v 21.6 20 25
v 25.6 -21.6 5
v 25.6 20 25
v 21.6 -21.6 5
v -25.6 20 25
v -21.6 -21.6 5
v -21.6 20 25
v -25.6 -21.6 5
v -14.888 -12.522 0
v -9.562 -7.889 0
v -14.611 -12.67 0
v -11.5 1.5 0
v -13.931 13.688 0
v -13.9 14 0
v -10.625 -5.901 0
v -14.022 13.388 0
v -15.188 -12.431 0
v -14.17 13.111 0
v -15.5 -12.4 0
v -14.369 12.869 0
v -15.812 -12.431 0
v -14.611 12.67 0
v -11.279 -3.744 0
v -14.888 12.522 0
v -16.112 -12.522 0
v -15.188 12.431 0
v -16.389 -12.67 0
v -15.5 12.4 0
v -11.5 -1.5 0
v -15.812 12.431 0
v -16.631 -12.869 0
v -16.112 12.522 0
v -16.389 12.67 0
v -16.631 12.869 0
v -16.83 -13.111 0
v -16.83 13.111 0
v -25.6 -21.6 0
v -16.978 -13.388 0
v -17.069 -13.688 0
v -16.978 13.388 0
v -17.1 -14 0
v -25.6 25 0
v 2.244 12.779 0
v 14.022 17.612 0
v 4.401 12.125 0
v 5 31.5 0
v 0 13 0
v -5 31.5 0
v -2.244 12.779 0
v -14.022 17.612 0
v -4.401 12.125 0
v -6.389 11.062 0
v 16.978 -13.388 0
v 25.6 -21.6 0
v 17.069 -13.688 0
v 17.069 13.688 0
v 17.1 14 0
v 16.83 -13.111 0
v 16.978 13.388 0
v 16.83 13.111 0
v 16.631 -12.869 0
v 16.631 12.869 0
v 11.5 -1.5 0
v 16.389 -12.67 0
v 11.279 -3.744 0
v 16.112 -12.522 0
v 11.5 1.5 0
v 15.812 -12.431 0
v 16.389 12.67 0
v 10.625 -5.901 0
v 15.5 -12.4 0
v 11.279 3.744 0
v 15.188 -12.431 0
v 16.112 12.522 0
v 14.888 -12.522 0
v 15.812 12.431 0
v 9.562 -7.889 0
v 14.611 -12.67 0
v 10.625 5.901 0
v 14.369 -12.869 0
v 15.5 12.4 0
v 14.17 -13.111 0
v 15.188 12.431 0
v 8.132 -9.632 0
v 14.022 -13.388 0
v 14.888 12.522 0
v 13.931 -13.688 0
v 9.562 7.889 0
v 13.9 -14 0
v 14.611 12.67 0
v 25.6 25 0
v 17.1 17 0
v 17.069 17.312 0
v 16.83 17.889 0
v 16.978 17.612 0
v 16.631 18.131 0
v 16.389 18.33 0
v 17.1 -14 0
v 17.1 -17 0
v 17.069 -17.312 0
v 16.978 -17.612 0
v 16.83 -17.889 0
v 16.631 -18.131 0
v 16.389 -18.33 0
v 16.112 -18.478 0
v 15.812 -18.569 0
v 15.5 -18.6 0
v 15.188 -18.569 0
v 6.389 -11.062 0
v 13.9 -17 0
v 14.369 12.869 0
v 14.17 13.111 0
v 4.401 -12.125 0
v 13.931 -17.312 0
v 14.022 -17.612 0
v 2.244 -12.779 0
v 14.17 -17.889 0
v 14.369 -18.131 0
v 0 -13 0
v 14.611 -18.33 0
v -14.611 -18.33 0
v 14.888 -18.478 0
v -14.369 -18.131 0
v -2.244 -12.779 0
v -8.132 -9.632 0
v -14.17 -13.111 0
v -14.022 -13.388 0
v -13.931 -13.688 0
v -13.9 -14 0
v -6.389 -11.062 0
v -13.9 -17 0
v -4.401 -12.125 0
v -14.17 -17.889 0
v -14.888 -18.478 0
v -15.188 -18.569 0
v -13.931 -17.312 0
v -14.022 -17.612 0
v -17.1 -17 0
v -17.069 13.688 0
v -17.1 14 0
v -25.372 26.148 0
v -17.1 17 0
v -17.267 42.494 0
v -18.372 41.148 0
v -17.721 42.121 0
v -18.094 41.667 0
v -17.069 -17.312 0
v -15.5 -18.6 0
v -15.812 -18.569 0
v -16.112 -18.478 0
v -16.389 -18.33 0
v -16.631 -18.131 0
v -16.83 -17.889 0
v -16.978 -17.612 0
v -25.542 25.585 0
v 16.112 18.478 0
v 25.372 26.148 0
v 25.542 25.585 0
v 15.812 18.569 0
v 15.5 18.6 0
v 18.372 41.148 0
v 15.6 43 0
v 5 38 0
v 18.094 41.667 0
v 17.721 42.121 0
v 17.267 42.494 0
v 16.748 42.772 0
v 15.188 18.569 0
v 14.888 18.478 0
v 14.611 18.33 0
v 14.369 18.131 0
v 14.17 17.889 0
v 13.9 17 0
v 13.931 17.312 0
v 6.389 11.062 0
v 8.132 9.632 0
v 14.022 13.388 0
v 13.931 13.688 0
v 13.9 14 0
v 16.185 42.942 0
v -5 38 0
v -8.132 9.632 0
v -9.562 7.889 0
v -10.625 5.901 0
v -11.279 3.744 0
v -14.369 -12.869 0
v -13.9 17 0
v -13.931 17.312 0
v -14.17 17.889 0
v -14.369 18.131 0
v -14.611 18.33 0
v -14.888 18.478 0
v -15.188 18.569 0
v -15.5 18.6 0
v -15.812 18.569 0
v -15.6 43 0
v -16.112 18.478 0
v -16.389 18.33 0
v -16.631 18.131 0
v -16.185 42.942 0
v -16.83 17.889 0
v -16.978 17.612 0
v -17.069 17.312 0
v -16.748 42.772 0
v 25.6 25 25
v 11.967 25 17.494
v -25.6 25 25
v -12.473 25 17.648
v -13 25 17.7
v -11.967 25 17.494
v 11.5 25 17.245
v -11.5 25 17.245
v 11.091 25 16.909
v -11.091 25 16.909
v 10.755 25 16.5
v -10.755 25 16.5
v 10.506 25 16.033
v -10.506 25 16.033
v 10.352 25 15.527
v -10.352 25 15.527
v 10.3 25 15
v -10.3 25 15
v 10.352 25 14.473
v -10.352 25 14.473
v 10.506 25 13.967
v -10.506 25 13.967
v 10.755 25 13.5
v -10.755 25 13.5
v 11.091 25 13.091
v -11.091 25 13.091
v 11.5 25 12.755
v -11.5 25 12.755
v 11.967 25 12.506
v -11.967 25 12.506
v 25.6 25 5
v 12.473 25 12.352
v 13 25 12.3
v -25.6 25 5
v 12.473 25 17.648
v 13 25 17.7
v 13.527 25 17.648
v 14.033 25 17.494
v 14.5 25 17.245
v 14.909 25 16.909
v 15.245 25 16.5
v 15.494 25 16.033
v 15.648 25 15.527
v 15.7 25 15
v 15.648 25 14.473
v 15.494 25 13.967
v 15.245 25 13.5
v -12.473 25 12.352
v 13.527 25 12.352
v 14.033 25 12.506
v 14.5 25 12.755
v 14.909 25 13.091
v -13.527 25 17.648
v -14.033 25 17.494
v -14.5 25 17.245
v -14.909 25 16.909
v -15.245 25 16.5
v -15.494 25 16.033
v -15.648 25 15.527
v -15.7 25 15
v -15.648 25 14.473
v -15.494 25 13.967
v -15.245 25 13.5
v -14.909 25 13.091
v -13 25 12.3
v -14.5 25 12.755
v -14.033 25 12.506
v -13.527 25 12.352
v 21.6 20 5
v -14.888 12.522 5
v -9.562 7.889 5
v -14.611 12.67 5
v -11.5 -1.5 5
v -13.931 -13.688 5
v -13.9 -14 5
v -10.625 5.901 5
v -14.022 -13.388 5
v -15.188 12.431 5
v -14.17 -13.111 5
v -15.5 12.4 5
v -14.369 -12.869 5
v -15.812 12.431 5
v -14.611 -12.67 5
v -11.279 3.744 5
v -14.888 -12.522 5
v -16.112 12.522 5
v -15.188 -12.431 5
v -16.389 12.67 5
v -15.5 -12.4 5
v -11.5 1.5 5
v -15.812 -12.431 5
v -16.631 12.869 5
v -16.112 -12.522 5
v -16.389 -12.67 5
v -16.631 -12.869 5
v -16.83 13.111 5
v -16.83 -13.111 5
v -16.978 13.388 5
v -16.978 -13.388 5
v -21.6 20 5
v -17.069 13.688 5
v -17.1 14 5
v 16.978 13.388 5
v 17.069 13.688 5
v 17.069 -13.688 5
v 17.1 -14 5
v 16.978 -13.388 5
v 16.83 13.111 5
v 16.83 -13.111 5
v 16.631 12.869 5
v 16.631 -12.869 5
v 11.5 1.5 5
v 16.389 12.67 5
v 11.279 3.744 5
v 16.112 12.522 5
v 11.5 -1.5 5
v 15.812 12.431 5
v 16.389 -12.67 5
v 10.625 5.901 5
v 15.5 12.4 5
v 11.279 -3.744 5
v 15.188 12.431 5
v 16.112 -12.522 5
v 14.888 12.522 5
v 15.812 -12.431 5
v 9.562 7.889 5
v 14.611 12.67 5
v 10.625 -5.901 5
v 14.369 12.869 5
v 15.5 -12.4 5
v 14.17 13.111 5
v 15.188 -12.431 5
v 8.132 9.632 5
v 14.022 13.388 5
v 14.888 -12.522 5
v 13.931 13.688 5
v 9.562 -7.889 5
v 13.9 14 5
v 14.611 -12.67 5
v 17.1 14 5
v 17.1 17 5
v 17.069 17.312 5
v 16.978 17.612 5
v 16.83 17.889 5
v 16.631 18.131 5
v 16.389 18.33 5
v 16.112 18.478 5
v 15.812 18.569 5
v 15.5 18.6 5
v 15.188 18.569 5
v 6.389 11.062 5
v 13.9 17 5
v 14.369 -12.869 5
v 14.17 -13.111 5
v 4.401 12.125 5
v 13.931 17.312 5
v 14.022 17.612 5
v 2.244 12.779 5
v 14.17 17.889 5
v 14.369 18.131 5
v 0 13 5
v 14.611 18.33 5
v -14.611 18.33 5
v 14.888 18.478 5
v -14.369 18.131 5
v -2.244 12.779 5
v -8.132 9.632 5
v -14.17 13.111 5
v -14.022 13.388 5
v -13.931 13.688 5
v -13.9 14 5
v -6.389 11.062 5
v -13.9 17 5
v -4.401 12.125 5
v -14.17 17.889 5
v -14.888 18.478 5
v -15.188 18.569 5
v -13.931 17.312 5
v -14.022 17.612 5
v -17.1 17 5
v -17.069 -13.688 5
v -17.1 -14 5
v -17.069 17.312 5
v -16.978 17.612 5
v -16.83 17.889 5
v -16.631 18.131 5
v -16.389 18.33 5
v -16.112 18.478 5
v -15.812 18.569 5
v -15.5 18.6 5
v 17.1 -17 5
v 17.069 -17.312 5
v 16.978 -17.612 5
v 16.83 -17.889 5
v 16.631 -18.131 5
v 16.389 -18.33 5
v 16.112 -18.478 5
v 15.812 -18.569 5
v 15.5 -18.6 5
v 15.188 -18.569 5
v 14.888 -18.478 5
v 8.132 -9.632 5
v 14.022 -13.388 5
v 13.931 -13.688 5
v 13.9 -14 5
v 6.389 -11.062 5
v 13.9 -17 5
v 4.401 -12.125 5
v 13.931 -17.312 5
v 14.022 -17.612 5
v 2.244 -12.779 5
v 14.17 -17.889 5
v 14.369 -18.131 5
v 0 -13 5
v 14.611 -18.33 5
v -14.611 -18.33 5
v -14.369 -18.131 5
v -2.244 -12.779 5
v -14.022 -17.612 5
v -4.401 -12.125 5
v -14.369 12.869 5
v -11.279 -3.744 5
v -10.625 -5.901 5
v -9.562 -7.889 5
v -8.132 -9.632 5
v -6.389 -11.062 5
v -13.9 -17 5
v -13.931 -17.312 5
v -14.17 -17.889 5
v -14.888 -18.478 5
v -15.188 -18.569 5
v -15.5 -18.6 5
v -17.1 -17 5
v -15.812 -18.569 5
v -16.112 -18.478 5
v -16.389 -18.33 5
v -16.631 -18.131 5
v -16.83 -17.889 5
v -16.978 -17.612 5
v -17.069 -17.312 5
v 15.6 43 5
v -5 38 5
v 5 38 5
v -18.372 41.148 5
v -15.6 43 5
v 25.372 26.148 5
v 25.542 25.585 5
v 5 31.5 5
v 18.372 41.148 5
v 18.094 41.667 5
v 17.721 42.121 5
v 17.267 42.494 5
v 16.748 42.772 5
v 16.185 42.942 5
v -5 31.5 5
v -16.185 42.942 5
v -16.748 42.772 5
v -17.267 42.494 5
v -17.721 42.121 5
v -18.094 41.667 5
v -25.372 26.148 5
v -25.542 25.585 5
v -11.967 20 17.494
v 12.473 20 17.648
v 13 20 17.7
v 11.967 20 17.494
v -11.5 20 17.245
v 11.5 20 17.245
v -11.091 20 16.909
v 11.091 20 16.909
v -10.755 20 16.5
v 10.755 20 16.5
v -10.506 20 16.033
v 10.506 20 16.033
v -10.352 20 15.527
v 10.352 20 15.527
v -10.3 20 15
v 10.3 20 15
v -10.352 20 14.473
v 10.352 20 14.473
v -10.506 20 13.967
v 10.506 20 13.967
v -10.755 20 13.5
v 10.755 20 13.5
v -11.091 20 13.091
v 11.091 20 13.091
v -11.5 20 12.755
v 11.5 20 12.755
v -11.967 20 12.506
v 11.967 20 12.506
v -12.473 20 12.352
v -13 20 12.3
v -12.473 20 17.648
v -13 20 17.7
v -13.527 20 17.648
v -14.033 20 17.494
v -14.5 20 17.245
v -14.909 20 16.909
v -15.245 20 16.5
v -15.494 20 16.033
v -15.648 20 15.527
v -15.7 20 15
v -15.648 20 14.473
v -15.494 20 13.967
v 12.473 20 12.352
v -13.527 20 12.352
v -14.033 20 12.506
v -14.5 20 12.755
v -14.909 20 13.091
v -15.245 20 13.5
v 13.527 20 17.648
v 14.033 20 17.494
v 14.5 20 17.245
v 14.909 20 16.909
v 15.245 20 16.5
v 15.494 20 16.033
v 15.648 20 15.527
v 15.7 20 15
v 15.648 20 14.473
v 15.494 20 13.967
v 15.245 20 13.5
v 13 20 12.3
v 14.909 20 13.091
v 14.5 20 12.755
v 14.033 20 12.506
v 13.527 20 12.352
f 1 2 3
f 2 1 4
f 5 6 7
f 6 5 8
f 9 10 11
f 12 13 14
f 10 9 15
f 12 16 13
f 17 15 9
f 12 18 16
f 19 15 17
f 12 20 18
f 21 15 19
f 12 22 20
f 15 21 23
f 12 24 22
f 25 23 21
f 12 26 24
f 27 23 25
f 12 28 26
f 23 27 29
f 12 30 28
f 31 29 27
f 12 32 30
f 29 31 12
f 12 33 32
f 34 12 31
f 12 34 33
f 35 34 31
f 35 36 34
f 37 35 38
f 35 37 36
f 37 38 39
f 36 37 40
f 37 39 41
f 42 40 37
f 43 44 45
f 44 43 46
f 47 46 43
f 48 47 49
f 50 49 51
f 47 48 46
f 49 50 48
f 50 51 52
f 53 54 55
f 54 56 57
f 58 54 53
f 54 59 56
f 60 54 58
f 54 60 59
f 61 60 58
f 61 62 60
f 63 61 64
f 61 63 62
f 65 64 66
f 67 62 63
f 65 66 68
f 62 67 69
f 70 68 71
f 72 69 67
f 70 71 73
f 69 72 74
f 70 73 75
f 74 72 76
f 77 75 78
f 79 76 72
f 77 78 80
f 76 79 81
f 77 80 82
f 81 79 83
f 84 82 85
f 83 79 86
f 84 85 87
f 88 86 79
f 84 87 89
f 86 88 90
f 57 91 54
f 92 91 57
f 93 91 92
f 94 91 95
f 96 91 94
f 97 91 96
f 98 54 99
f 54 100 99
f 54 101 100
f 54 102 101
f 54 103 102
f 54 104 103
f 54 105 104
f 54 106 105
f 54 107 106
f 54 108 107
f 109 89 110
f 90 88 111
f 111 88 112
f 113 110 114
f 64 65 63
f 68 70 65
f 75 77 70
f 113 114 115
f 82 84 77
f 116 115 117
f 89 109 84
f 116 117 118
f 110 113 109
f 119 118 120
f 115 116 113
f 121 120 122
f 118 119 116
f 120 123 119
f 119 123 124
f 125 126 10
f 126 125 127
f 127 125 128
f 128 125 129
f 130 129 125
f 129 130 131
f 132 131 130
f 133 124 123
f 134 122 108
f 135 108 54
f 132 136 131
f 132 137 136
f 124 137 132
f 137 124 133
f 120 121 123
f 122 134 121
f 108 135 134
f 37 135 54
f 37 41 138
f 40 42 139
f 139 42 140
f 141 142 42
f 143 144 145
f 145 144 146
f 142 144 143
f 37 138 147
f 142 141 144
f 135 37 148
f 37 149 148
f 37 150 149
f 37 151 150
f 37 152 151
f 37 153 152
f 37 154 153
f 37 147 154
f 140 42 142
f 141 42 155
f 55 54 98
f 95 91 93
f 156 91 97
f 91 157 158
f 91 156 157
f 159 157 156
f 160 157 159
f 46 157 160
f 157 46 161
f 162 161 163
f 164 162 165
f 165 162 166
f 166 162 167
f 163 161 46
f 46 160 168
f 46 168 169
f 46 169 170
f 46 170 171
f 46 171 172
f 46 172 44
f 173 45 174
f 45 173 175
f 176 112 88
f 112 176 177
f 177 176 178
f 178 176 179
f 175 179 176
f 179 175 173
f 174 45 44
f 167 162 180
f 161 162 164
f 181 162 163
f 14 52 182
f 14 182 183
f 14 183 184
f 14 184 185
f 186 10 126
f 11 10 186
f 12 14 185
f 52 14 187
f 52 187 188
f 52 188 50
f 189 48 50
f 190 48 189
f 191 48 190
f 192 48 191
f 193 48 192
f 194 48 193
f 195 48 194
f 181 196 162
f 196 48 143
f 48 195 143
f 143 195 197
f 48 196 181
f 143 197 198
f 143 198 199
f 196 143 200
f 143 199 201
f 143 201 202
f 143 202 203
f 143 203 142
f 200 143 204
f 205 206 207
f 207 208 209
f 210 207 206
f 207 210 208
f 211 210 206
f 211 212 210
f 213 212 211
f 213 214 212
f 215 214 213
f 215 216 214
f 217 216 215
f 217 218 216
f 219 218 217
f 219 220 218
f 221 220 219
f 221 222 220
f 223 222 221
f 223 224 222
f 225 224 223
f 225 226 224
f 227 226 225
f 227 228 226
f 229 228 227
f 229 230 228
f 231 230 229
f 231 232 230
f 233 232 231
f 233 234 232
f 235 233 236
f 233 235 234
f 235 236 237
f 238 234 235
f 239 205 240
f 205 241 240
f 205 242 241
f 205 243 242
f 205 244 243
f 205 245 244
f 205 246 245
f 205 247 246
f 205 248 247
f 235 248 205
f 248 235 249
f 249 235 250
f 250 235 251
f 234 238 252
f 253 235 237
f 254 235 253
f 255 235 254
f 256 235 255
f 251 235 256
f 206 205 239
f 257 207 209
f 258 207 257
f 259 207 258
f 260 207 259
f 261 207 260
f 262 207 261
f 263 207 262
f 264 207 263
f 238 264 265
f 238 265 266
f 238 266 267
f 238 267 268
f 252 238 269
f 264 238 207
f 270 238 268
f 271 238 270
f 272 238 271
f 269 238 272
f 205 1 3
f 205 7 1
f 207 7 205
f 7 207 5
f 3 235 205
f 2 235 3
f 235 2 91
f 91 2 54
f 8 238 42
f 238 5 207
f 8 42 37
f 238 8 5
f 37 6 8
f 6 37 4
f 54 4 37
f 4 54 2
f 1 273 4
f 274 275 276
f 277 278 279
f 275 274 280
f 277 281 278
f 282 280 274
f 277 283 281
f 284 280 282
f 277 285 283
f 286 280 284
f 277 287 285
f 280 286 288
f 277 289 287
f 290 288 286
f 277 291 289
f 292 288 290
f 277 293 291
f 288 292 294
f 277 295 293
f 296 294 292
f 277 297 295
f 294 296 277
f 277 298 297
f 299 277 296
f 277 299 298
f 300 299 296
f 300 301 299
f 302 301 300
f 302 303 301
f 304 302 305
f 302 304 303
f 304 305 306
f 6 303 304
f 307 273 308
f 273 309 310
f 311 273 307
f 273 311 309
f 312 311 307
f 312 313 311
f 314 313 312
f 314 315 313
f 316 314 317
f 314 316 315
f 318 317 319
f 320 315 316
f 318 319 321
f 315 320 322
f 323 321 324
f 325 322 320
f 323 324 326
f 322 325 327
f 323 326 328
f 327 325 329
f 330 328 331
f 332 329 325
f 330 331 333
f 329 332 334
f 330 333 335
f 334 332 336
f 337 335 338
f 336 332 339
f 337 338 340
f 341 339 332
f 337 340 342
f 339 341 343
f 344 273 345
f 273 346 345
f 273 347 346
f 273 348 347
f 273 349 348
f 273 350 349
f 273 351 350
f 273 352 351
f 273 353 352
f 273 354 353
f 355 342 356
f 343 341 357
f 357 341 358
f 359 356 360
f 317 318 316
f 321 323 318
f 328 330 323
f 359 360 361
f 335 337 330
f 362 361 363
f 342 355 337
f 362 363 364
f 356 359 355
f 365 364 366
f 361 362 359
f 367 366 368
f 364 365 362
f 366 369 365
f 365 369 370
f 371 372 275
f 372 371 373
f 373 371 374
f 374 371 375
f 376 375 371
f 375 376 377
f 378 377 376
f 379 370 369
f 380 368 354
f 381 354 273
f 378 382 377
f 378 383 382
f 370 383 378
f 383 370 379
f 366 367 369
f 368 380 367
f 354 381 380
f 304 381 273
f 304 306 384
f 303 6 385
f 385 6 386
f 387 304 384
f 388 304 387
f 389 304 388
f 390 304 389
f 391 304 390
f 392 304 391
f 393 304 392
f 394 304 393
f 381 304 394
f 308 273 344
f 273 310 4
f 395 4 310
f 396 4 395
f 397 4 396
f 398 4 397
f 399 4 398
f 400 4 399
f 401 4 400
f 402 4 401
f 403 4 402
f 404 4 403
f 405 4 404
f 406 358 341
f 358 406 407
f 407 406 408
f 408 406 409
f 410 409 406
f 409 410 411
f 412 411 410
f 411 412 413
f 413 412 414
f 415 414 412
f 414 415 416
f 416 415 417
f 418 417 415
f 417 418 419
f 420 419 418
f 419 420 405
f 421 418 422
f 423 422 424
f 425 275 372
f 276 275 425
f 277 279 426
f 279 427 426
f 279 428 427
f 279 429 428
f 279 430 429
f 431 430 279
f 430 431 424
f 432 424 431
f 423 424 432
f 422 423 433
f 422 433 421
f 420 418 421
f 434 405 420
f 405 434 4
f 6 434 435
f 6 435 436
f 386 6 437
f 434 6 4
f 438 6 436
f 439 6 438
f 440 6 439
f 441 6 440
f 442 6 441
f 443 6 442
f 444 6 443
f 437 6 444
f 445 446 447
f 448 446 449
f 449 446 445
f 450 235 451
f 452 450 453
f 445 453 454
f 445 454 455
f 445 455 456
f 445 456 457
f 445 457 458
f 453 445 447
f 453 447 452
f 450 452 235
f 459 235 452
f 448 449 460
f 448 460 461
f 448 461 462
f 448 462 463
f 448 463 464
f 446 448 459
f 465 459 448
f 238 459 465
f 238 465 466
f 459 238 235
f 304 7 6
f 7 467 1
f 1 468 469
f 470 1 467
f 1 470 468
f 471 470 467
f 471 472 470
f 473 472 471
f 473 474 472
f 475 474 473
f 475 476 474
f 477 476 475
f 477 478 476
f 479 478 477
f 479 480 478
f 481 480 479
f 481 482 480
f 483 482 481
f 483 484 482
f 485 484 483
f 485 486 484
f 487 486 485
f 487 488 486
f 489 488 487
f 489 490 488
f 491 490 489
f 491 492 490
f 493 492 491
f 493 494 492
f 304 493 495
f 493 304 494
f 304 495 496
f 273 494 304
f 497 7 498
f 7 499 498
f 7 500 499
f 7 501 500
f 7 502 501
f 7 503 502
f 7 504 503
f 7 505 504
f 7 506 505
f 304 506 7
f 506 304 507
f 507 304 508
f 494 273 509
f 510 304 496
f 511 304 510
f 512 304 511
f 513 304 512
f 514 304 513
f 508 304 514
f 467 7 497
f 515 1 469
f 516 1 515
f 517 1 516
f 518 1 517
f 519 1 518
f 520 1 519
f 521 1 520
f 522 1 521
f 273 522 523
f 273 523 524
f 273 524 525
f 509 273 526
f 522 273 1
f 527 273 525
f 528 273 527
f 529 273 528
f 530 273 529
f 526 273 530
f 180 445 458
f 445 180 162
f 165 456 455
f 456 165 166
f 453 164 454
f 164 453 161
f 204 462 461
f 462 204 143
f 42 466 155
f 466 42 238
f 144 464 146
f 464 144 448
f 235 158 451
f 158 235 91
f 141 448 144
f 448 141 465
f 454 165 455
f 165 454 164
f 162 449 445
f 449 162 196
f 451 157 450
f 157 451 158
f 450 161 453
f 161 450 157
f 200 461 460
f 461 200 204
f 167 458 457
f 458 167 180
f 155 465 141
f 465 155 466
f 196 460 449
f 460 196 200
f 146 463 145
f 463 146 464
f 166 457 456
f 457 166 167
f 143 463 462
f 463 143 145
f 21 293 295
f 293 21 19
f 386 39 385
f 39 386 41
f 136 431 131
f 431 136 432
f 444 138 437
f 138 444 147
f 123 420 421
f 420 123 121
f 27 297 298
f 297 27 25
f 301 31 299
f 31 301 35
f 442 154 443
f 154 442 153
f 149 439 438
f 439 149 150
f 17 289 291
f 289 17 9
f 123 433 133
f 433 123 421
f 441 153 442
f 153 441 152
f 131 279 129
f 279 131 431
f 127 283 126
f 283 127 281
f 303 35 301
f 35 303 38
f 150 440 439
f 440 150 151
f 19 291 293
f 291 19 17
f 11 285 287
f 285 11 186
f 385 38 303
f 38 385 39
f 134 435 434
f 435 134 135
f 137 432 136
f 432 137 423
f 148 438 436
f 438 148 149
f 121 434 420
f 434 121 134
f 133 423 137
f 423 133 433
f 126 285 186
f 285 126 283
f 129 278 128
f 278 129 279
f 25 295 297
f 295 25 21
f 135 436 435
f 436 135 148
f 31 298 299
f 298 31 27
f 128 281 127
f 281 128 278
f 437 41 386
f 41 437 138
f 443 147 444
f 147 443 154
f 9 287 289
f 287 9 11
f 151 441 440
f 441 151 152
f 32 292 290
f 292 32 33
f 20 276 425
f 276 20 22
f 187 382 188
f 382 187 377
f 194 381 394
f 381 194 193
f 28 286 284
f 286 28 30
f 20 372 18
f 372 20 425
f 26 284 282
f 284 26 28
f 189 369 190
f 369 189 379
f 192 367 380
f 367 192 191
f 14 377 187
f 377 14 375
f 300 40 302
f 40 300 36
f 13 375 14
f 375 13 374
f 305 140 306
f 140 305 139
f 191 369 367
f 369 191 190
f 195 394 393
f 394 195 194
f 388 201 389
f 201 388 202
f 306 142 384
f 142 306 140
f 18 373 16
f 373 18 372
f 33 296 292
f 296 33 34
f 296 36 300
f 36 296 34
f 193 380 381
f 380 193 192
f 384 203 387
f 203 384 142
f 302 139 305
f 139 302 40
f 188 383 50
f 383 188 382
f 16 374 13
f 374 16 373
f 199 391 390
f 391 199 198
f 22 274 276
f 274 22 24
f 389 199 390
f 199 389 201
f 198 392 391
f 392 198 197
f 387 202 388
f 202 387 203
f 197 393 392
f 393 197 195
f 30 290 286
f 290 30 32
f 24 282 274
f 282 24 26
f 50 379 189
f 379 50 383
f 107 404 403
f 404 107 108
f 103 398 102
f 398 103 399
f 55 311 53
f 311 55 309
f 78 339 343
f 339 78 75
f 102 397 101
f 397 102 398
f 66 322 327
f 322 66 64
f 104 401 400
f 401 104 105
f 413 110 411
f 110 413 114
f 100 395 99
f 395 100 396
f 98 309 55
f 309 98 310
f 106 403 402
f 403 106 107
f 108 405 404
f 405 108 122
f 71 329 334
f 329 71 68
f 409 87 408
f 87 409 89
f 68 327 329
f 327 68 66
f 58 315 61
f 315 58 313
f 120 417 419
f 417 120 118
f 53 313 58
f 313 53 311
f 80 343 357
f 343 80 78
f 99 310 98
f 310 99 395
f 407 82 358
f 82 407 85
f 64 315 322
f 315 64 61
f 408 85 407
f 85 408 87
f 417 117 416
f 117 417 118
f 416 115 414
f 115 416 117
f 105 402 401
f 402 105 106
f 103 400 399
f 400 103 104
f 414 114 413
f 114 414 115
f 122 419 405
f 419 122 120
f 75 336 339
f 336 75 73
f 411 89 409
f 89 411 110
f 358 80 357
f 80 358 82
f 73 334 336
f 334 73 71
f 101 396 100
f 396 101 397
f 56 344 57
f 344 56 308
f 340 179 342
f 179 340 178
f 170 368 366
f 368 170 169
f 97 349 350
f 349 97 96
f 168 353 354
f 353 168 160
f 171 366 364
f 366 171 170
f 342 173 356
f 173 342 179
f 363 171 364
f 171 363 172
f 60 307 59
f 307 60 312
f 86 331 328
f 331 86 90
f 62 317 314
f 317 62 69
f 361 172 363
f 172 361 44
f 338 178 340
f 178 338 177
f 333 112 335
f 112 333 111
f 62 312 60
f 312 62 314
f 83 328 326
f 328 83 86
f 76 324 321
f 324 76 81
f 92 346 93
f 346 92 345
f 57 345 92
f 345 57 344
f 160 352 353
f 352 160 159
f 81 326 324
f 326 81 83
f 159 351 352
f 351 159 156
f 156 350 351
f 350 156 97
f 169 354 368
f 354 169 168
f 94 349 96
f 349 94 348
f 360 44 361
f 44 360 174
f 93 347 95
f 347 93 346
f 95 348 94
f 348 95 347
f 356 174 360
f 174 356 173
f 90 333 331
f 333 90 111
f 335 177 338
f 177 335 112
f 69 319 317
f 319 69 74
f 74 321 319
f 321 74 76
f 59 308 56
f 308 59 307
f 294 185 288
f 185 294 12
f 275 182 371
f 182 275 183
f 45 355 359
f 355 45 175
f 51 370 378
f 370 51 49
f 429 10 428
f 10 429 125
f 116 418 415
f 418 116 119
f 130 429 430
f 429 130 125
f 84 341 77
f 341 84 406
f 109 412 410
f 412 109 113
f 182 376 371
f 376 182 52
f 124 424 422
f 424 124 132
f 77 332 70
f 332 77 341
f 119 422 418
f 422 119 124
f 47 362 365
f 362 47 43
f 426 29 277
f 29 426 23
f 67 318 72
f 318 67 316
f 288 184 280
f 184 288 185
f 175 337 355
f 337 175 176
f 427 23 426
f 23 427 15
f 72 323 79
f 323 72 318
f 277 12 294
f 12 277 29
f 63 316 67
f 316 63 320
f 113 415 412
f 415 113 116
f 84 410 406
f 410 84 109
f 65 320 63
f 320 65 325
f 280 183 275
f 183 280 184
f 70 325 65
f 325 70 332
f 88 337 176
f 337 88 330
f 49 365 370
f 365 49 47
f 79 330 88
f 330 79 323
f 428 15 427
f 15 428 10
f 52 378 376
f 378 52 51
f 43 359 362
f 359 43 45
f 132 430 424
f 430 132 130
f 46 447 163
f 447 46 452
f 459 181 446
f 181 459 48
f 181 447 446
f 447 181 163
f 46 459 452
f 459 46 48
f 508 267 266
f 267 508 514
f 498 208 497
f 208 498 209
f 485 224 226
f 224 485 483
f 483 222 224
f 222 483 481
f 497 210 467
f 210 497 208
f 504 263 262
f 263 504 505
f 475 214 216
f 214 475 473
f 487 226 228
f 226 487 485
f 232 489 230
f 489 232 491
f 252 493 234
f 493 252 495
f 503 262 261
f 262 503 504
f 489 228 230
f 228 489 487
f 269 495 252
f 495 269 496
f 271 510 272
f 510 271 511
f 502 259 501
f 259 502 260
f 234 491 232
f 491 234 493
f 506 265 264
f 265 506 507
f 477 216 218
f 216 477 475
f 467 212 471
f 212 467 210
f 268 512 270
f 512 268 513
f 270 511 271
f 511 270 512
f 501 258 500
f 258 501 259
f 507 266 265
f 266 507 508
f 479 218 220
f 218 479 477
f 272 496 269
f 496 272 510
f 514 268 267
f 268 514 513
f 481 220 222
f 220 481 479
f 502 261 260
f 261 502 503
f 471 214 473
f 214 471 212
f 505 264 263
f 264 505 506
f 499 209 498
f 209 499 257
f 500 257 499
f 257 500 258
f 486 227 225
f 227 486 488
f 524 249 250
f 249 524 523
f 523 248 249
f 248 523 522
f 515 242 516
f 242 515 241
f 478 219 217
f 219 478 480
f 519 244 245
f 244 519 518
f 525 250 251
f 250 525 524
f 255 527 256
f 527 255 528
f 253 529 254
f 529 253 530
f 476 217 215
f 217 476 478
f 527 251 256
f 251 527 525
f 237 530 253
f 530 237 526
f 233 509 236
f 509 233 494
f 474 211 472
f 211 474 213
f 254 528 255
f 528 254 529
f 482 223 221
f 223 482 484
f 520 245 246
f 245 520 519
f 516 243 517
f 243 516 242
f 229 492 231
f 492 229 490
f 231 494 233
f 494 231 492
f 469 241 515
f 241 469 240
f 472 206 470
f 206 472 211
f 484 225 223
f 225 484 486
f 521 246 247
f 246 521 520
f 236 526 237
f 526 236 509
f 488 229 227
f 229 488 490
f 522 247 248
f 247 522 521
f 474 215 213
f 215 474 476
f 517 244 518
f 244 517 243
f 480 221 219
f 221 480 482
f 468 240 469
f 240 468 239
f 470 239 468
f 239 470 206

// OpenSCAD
$fn=32;

mgn12h=13;
zconnh=12;
c=mgn12h+zconnh;
nemaw=43.2;
nemah=31;

l=nemaw/2+c;
difference() {
    union() {
        
        hull() {
            translate([-nemaw/2-4,-nemaw/2,0]) cube([nemaw+8,l,5]);
            translate([-nemaw/2-4+3,c,0]) cylinder(d=6,h=5);
            translate([-nemaw/2-4+3+7,c+15,0]) cylinder(d=6,h=5);
            translate([nemaw/2+4-3-7,c+15,0]) cylinder(d=6,h=5);
            translate([nemaw/2+4-3,c,0]) cylinder(d=6,h=5);
        }
        difference() {
            hull() {
                translate([-nemaw/2-4,-nemaw/2,0]) cube([nemaw+8,l,5]);
                translate([-nemaw/2-4,c-5,0]) cube([nemaw+8,5,25]);
            }
            translate([-nemaw/2,-nemaw/2-1,5]) cube([nemaw, l-5+1, 30]);
        } 
    }
    
    // motor
    translate([0,0,-1]) {
        hull() {
            translate([0,1.5,0]) cylinder(d=23,h=10);
            translate([0,-1.5,0]) cylinder(d=23,h=10);
        }
        for (x=[-nemah/2,nemah/2]) for (y=[-nemah/2,nemah/2]) hull() {
            translate([x,y-1.5,0]) cylinder(d=3.2,h=10);
            translate([x,y+1.5,0]) cylinder(d=3.2,h=10);
        }
    }
    
    // connector
    translate([-5,c+10-3.5,-1]) cube([10,6.5,10]);
//    translate([13-4.5,c+10-3,-1]) cube([9,5.8,10]);
    
    translate([-13,c-6,15]) rotate([-90,0,0]) cylinder(d=5.4,h=10);
    translate([13,c-6,15]) rotate([-90,0,0]) cylinder(d=5.4,h=10);
}
